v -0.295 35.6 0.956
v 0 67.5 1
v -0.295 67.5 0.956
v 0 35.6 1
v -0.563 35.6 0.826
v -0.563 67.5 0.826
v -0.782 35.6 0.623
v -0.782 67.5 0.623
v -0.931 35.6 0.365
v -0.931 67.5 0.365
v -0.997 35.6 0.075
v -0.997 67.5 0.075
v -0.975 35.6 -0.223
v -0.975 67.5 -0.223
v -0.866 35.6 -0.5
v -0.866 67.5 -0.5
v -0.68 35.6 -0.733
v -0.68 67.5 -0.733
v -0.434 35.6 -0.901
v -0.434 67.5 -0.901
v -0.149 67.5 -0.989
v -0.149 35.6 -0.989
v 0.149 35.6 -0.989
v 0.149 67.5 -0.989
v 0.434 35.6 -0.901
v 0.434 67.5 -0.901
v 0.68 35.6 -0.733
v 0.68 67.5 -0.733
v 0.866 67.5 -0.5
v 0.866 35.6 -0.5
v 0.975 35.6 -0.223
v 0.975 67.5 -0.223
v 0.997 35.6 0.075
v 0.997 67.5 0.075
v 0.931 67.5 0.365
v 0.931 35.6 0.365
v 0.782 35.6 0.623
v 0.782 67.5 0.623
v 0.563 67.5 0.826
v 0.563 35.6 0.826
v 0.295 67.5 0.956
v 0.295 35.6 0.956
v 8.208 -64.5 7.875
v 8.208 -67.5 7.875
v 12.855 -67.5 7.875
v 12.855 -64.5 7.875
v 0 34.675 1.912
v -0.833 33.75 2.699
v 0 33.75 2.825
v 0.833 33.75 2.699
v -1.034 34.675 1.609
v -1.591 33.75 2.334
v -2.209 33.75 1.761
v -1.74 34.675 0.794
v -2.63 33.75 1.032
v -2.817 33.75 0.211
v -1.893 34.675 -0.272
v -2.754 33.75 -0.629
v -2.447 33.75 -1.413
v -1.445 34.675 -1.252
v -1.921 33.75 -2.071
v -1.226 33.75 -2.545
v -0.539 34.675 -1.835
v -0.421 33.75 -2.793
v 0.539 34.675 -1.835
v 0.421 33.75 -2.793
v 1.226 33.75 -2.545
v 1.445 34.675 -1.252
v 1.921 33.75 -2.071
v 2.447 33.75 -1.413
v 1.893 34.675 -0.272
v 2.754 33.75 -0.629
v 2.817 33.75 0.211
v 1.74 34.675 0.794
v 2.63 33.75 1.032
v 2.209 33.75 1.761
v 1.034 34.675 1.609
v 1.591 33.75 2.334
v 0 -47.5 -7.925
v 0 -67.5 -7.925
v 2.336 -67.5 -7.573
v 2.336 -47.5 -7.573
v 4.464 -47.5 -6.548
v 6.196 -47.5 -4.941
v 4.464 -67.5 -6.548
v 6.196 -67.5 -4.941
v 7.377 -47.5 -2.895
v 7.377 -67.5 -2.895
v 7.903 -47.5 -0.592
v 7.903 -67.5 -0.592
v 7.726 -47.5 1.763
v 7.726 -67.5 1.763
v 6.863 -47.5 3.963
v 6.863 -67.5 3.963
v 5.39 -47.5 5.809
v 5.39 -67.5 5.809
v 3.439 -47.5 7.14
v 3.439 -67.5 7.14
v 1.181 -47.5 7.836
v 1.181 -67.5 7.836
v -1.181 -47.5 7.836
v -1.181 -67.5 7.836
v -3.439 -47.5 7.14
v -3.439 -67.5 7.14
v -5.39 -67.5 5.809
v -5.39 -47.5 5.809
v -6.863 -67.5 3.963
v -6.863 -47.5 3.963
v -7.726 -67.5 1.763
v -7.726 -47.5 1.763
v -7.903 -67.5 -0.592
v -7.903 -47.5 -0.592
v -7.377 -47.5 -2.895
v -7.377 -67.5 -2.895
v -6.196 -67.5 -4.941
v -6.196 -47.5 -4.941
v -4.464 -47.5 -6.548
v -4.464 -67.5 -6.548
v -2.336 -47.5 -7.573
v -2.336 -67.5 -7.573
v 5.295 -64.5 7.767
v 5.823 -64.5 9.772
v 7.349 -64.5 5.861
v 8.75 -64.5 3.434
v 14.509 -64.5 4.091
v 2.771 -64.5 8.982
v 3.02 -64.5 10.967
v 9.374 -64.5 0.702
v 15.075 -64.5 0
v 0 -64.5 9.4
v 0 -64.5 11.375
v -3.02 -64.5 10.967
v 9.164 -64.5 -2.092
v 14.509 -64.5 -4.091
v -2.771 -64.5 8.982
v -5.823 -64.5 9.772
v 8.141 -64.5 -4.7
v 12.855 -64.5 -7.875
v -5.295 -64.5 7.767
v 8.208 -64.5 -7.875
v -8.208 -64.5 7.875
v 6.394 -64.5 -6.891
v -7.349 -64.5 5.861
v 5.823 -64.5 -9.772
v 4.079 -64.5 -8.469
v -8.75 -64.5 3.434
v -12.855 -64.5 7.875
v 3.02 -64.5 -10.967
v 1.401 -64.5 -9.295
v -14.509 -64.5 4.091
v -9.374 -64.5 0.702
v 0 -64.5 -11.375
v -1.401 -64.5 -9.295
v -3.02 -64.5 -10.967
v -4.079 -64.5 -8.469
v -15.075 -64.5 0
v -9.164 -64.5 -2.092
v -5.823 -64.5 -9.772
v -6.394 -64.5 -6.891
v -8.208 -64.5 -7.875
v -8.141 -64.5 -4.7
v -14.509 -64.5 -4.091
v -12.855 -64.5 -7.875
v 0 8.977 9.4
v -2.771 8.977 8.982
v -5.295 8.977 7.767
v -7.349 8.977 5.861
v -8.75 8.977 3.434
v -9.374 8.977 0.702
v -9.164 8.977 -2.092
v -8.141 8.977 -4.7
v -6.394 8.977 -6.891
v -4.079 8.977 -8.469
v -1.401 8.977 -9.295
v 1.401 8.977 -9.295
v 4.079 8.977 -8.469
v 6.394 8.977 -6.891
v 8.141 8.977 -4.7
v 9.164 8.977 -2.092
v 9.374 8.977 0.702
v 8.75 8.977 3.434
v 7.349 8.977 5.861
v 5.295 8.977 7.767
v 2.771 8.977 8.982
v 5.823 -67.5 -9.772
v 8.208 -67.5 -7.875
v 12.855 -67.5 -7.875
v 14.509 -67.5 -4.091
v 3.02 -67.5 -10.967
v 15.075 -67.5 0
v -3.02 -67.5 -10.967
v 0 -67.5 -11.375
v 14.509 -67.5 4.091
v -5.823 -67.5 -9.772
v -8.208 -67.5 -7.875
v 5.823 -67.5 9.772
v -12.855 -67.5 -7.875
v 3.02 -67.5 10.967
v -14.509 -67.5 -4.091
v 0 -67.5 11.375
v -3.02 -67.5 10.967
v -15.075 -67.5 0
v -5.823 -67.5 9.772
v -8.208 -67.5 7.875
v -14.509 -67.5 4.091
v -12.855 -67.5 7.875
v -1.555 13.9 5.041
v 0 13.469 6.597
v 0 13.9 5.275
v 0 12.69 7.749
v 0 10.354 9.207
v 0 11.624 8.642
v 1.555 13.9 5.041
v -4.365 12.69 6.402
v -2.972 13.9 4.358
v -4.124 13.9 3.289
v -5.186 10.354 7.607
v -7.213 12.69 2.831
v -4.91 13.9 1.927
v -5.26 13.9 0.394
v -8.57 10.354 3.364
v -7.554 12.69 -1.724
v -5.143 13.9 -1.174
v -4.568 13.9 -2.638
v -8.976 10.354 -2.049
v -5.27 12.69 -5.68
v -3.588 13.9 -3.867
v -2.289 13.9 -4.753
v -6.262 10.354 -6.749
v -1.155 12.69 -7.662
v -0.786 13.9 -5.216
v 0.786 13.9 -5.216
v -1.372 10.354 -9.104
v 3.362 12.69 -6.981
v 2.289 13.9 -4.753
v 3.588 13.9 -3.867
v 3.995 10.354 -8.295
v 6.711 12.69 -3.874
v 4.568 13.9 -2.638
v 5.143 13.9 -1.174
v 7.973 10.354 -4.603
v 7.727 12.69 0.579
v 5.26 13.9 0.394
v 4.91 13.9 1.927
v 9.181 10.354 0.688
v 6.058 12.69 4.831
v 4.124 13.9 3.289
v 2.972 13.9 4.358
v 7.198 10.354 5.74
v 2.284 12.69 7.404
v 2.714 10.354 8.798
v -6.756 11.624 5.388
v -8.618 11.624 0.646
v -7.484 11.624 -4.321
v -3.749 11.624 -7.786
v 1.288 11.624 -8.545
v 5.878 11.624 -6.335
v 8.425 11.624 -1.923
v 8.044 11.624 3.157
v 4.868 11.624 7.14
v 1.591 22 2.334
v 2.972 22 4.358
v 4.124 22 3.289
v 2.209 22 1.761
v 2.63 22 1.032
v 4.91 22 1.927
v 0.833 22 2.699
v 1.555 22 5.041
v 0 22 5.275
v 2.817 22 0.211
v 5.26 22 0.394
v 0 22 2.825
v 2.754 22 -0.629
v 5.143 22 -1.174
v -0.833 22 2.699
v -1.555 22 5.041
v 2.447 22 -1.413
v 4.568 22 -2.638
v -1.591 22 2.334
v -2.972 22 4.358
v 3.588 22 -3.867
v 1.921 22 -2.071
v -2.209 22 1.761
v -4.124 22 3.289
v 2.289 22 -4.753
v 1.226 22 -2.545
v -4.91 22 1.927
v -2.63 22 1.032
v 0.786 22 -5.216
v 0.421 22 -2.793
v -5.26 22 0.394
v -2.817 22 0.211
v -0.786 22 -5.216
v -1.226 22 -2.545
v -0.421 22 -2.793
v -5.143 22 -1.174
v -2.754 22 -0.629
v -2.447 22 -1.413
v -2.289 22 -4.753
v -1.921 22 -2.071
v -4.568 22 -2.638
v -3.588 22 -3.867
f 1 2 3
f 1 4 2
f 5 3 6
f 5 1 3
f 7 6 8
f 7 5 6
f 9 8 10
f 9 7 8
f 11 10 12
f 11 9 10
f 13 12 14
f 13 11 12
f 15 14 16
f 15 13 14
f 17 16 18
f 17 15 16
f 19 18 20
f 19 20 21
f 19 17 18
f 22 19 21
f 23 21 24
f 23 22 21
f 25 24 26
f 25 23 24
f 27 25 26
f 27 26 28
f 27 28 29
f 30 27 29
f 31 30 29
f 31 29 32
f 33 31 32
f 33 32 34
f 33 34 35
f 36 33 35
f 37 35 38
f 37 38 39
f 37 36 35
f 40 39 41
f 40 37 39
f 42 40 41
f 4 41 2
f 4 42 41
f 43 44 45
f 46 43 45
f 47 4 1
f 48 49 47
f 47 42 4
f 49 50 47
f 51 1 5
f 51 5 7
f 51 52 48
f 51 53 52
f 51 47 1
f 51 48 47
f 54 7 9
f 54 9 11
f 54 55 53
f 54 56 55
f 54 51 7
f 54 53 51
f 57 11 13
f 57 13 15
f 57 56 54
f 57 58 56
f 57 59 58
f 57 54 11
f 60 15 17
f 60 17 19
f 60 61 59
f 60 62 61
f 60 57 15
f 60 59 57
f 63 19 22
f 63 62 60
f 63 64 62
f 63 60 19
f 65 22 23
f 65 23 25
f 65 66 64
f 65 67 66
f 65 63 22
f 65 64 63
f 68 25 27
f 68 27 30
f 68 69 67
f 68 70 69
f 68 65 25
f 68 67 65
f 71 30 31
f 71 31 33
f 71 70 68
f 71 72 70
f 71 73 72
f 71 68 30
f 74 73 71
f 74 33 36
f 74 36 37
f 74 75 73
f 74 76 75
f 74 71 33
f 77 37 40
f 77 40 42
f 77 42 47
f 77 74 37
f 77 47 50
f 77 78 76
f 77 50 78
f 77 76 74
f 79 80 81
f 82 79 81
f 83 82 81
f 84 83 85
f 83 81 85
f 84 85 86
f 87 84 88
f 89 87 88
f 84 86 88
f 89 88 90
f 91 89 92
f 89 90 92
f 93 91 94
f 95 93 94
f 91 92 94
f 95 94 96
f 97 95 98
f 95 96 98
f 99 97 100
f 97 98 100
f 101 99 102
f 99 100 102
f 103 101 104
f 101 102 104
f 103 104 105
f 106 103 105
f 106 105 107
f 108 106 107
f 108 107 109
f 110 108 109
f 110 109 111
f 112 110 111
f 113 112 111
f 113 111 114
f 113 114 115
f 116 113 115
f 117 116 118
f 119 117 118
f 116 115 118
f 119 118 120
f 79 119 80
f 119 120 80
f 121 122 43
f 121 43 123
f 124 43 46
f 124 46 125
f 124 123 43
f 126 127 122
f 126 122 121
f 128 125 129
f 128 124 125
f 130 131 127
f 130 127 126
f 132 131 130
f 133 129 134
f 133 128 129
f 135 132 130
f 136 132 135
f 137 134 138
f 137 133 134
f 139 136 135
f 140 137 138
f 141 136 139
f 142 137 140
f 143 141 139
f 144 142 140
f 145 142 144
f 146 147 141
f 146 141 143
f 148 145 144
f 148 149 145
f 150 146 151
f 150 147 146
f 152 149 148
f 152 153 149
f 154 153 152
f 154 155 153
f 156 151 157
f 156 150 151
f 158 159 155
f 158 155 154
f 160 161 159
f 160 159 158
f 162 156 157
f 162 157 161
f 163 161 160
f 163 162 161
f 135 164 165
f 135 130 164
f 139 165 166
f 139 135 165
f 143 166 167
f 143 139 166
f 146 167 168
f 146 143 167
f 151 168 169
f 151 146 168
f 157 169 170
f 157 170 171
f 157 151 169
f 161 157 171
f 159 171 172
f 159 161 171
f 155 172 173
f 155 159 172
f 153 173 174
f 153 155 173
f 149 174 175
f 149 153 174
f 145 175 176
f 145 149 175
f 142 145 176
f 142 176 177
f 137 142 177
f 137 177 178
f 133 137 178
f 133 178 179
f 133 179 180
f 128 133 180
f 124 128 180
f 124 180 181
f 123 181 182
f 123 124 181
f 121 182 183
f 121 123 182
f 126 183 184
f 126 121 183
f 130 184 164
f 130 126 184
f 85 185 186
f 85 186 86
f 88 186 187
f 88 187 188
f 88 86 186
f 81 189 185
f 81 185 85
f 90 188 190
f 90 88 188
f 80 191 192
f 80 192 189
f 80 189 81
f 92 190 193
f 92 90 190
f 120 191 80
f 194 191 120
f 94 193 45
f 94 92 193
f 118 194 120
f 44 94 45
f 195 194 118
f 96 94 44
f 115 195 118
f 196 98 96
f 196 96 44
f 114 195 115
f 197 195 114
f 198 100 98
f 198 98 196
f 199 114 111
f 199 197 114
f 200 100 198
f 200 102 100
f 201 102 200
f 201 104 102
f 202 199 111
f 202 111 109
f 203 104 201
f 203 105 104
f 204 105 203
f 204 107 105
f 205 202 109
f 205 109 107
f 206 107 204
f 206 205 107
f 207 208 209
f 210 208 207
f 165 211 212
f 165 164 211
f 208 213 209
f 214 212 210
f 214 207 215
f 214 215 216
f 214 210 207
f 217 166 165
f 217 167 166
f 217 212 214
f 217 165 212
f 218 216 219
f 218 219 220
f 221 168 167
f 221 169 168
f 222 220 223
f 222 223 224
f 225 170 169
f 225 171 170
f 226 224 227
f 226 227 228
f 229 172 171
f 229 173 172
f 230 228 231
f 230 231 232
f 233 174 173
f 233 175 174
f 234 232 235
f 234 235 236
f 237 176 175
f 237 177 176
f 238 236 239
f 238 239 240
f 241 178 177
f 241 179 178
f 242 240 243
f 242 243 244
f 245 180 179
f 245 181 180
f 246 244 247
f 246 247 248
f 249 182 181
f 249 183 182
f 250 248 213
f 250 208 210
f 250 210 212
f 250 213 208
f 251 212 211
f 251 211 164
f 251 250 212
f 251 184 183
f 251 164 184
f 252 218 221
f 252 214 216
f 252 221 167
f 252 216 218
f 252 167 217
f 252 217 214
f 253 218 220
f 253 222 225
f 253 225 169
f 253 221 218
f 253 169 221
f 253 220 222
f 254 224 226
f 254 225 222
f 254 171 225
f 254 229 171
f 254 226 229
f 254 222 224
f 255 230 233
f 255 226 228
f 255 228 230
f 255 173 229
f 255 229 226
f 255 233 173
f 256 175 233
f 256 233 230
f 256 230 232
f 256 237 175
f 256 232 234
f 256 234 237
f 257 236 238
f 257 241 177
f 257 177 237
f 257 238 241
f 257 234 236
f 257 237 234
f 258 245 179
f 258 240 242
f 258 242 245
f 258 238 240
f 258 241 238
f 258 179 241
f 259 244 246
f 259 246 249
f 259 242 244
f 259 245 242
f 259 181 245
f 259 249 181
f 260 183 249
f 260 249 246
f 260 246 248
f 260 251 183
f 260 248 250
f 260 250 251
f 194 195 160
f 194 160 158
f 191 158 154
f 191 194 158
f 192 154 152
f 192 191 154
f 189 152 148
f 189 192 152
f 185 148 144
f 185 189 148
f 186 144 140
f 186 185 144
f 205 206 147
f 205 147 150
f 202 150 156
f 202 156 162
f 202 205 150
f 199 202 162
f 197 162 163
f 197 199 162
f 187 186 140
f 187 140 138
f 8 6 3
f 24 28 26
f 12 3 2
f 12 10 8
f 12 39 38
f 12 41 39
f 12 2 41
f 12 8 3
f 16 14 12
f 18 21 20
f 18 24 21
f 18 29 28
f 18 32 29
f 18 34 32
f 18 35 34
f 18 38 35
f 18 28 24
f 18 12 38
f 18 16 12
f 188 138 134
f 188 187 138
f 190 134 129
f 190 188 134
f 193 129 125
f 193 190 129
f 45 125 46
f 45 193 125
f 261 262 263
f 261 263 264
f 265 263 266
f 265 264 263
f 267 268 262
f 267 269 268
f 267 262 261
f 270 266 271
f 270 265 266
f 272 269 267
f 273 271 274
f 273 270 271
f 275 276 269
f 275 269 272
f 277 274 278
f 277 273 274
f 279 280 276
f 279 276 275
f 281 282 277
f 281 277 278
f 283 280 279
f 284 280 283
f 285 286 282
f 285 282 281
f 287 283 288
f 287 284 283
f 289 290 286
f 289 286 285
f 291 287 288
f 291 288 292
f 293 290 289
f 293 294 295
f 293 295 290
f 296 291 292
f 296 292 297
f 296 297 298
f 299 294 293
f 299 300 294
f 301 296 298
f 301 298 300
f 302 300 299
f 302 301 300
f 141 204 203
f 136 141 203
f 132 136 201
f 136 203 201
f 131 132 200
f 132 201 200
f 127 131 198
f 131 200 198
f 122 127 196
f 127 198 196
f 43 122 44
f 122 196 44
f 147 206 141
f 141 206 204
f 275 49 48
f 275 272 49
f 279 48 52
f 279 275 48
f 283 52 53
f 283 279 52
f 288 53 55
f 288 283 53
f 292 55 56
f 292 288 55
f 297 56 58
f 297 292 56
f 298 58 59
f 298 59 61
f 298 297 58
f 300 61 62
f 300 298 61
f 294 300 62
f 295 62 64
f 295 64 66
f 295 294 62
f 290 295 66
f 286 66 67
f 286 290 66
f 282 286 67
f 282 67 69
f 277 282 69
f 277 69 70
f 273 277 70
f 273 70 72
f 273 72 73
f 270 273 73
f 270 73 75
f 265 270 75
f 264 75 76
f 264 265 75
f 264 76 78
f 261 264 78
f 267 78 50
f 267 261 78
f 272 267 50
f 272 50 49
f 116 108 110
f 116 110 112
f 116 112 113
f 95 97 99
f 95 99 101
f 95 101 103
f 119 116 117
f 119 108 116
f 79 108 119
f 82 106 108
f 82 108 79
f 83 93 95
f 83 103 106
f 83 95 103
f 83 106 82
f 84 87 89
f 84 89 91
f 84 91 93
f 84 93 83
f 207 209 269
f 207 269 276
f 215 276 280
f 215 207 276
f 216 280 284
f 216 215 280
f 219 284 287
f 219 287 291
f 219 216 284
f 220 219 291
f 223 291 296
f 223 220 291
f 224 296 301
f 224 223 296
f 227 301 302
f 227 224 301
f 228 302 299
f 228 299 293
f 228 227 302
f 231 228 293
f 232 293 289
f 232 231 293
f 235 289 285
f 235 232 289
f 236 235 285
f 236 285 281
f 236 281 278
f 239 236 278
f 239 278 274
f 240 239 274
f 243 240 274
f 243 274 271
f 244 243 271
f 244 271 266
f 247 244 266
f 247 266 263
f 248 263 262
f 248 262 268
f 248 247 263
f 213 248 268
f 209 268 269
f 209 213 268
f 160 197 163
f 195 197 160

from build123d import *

# Parameters (mm, degrees)
FILLET1_R          = 5
CUT_EXTRUDE1_START = -3
CUT_EXTRUDE1_DEPTH = 3
SKETCH4_R          = 7.925
CUT_EXTRUDE2_DEPTH = 20


with BuildPart() as part:
    # Sketch2 → Revolve1 (revolve)
    with BuildSketch(Plane.XY, mode=Mode.PRIVATE) as revolve1_sk:
        Polygon((15.075, -67.5), (0, -67.5), (0, 67.5), (1, 67.5), (1, 35.6), (2.825, 33.749724479), (2.825, 22), (5.275, 22), (5.275, 13.9), (9.4, 13.9), (9.4, -64.5), (15.075, -64.5), align=None)
    revolve(revolve1_sk.sketch.rotate(Axis((0, 24.52235385, 0), (0, -1, 0)), 90), axis=Axis((0, 24.52235385, 0), (0, -1, 0)))

    # Fillet1
    # the kernel refuses this fillet: 5 mm, written as the material it takes off along each edge
    with BuildSketch(Plane(origin=(0, 13.9, 0), x_dir=(0, 0, 1), z_dir=(1, 0, 0))) as fillet1_piece_1:
        with BuildLine():
            CenterArc((4.4, 4.922842167), FILLET1_R, 280.078658108, 79.921341892)
            Line((9.4, 4.922842167), (9.5, 4.922842167))
            Line((9.5, 4.922842167), (9.5, 0))
            Line((9.5, 0), (9.4, -0.1))
            ThreePointArc((9.4, -0.1), (7.3375, -0.1), (5.2925, -0.098456843))
            Line((5.2925, -0.098456843), (5.275, 0))
        make_face()
    revolve(axis=Axis((0, 13.9, 0), (0, -1, 0)), mode=Mode.SUBTRACT)

    # Sketch3 → Cut-Extrude1 (cut)
    with BuildSketch(Plane(origin=(0, -64.5, 0), x_dir=(1, 0, 0), z_dir=(0, 1, 0)).offset(CUT_EXTRUDE1_START)):
        with BuildLine():
            Line((-12.854571171, 7.875), (-8.20822758, 7.875))
            ThreePointArc((-8.20822758, 7.875), (0, 11.375), (8.20822758, 7.875))
            Line((8.20822758, 7.875), (12.854571171, 7.875))
            ThreePointArc((12.854571171, 7.875), (0, 15.075), (-12.854571171, 7.875))
        make_face()
        with BuildLine():
            Line((-12.854571171, -7.875), (-8.20822758, -7.875))
            ThreePointArc((-8.20822758, -7.875), (0, -11.375), (8.20822758, -7.875))
            Line((8.20822758, -7.875), (12.854571171, -7.875))
            ThreePointArc((12.854571171, -7.875), (0, -15.075), (-12.854571171, -7.875))
        make_face()
    extrude(amount=CUT_EXTRUDE1_DEPTH, mode=Mode.SUBTRACT)

    # Sketch4 → Cut-Extrude2 (cut)
    with BuildSketch(Plane.XZ.offset(67.5)):
        with Locations(Location((0, 0, 0), (0, 0, 270))):
            Circle(SKETCH4_R)
    extrude(amount=-CUT_EXTRUDE2_DEPTH, mode=Mode.SUBTRACT)


solid = part.part
